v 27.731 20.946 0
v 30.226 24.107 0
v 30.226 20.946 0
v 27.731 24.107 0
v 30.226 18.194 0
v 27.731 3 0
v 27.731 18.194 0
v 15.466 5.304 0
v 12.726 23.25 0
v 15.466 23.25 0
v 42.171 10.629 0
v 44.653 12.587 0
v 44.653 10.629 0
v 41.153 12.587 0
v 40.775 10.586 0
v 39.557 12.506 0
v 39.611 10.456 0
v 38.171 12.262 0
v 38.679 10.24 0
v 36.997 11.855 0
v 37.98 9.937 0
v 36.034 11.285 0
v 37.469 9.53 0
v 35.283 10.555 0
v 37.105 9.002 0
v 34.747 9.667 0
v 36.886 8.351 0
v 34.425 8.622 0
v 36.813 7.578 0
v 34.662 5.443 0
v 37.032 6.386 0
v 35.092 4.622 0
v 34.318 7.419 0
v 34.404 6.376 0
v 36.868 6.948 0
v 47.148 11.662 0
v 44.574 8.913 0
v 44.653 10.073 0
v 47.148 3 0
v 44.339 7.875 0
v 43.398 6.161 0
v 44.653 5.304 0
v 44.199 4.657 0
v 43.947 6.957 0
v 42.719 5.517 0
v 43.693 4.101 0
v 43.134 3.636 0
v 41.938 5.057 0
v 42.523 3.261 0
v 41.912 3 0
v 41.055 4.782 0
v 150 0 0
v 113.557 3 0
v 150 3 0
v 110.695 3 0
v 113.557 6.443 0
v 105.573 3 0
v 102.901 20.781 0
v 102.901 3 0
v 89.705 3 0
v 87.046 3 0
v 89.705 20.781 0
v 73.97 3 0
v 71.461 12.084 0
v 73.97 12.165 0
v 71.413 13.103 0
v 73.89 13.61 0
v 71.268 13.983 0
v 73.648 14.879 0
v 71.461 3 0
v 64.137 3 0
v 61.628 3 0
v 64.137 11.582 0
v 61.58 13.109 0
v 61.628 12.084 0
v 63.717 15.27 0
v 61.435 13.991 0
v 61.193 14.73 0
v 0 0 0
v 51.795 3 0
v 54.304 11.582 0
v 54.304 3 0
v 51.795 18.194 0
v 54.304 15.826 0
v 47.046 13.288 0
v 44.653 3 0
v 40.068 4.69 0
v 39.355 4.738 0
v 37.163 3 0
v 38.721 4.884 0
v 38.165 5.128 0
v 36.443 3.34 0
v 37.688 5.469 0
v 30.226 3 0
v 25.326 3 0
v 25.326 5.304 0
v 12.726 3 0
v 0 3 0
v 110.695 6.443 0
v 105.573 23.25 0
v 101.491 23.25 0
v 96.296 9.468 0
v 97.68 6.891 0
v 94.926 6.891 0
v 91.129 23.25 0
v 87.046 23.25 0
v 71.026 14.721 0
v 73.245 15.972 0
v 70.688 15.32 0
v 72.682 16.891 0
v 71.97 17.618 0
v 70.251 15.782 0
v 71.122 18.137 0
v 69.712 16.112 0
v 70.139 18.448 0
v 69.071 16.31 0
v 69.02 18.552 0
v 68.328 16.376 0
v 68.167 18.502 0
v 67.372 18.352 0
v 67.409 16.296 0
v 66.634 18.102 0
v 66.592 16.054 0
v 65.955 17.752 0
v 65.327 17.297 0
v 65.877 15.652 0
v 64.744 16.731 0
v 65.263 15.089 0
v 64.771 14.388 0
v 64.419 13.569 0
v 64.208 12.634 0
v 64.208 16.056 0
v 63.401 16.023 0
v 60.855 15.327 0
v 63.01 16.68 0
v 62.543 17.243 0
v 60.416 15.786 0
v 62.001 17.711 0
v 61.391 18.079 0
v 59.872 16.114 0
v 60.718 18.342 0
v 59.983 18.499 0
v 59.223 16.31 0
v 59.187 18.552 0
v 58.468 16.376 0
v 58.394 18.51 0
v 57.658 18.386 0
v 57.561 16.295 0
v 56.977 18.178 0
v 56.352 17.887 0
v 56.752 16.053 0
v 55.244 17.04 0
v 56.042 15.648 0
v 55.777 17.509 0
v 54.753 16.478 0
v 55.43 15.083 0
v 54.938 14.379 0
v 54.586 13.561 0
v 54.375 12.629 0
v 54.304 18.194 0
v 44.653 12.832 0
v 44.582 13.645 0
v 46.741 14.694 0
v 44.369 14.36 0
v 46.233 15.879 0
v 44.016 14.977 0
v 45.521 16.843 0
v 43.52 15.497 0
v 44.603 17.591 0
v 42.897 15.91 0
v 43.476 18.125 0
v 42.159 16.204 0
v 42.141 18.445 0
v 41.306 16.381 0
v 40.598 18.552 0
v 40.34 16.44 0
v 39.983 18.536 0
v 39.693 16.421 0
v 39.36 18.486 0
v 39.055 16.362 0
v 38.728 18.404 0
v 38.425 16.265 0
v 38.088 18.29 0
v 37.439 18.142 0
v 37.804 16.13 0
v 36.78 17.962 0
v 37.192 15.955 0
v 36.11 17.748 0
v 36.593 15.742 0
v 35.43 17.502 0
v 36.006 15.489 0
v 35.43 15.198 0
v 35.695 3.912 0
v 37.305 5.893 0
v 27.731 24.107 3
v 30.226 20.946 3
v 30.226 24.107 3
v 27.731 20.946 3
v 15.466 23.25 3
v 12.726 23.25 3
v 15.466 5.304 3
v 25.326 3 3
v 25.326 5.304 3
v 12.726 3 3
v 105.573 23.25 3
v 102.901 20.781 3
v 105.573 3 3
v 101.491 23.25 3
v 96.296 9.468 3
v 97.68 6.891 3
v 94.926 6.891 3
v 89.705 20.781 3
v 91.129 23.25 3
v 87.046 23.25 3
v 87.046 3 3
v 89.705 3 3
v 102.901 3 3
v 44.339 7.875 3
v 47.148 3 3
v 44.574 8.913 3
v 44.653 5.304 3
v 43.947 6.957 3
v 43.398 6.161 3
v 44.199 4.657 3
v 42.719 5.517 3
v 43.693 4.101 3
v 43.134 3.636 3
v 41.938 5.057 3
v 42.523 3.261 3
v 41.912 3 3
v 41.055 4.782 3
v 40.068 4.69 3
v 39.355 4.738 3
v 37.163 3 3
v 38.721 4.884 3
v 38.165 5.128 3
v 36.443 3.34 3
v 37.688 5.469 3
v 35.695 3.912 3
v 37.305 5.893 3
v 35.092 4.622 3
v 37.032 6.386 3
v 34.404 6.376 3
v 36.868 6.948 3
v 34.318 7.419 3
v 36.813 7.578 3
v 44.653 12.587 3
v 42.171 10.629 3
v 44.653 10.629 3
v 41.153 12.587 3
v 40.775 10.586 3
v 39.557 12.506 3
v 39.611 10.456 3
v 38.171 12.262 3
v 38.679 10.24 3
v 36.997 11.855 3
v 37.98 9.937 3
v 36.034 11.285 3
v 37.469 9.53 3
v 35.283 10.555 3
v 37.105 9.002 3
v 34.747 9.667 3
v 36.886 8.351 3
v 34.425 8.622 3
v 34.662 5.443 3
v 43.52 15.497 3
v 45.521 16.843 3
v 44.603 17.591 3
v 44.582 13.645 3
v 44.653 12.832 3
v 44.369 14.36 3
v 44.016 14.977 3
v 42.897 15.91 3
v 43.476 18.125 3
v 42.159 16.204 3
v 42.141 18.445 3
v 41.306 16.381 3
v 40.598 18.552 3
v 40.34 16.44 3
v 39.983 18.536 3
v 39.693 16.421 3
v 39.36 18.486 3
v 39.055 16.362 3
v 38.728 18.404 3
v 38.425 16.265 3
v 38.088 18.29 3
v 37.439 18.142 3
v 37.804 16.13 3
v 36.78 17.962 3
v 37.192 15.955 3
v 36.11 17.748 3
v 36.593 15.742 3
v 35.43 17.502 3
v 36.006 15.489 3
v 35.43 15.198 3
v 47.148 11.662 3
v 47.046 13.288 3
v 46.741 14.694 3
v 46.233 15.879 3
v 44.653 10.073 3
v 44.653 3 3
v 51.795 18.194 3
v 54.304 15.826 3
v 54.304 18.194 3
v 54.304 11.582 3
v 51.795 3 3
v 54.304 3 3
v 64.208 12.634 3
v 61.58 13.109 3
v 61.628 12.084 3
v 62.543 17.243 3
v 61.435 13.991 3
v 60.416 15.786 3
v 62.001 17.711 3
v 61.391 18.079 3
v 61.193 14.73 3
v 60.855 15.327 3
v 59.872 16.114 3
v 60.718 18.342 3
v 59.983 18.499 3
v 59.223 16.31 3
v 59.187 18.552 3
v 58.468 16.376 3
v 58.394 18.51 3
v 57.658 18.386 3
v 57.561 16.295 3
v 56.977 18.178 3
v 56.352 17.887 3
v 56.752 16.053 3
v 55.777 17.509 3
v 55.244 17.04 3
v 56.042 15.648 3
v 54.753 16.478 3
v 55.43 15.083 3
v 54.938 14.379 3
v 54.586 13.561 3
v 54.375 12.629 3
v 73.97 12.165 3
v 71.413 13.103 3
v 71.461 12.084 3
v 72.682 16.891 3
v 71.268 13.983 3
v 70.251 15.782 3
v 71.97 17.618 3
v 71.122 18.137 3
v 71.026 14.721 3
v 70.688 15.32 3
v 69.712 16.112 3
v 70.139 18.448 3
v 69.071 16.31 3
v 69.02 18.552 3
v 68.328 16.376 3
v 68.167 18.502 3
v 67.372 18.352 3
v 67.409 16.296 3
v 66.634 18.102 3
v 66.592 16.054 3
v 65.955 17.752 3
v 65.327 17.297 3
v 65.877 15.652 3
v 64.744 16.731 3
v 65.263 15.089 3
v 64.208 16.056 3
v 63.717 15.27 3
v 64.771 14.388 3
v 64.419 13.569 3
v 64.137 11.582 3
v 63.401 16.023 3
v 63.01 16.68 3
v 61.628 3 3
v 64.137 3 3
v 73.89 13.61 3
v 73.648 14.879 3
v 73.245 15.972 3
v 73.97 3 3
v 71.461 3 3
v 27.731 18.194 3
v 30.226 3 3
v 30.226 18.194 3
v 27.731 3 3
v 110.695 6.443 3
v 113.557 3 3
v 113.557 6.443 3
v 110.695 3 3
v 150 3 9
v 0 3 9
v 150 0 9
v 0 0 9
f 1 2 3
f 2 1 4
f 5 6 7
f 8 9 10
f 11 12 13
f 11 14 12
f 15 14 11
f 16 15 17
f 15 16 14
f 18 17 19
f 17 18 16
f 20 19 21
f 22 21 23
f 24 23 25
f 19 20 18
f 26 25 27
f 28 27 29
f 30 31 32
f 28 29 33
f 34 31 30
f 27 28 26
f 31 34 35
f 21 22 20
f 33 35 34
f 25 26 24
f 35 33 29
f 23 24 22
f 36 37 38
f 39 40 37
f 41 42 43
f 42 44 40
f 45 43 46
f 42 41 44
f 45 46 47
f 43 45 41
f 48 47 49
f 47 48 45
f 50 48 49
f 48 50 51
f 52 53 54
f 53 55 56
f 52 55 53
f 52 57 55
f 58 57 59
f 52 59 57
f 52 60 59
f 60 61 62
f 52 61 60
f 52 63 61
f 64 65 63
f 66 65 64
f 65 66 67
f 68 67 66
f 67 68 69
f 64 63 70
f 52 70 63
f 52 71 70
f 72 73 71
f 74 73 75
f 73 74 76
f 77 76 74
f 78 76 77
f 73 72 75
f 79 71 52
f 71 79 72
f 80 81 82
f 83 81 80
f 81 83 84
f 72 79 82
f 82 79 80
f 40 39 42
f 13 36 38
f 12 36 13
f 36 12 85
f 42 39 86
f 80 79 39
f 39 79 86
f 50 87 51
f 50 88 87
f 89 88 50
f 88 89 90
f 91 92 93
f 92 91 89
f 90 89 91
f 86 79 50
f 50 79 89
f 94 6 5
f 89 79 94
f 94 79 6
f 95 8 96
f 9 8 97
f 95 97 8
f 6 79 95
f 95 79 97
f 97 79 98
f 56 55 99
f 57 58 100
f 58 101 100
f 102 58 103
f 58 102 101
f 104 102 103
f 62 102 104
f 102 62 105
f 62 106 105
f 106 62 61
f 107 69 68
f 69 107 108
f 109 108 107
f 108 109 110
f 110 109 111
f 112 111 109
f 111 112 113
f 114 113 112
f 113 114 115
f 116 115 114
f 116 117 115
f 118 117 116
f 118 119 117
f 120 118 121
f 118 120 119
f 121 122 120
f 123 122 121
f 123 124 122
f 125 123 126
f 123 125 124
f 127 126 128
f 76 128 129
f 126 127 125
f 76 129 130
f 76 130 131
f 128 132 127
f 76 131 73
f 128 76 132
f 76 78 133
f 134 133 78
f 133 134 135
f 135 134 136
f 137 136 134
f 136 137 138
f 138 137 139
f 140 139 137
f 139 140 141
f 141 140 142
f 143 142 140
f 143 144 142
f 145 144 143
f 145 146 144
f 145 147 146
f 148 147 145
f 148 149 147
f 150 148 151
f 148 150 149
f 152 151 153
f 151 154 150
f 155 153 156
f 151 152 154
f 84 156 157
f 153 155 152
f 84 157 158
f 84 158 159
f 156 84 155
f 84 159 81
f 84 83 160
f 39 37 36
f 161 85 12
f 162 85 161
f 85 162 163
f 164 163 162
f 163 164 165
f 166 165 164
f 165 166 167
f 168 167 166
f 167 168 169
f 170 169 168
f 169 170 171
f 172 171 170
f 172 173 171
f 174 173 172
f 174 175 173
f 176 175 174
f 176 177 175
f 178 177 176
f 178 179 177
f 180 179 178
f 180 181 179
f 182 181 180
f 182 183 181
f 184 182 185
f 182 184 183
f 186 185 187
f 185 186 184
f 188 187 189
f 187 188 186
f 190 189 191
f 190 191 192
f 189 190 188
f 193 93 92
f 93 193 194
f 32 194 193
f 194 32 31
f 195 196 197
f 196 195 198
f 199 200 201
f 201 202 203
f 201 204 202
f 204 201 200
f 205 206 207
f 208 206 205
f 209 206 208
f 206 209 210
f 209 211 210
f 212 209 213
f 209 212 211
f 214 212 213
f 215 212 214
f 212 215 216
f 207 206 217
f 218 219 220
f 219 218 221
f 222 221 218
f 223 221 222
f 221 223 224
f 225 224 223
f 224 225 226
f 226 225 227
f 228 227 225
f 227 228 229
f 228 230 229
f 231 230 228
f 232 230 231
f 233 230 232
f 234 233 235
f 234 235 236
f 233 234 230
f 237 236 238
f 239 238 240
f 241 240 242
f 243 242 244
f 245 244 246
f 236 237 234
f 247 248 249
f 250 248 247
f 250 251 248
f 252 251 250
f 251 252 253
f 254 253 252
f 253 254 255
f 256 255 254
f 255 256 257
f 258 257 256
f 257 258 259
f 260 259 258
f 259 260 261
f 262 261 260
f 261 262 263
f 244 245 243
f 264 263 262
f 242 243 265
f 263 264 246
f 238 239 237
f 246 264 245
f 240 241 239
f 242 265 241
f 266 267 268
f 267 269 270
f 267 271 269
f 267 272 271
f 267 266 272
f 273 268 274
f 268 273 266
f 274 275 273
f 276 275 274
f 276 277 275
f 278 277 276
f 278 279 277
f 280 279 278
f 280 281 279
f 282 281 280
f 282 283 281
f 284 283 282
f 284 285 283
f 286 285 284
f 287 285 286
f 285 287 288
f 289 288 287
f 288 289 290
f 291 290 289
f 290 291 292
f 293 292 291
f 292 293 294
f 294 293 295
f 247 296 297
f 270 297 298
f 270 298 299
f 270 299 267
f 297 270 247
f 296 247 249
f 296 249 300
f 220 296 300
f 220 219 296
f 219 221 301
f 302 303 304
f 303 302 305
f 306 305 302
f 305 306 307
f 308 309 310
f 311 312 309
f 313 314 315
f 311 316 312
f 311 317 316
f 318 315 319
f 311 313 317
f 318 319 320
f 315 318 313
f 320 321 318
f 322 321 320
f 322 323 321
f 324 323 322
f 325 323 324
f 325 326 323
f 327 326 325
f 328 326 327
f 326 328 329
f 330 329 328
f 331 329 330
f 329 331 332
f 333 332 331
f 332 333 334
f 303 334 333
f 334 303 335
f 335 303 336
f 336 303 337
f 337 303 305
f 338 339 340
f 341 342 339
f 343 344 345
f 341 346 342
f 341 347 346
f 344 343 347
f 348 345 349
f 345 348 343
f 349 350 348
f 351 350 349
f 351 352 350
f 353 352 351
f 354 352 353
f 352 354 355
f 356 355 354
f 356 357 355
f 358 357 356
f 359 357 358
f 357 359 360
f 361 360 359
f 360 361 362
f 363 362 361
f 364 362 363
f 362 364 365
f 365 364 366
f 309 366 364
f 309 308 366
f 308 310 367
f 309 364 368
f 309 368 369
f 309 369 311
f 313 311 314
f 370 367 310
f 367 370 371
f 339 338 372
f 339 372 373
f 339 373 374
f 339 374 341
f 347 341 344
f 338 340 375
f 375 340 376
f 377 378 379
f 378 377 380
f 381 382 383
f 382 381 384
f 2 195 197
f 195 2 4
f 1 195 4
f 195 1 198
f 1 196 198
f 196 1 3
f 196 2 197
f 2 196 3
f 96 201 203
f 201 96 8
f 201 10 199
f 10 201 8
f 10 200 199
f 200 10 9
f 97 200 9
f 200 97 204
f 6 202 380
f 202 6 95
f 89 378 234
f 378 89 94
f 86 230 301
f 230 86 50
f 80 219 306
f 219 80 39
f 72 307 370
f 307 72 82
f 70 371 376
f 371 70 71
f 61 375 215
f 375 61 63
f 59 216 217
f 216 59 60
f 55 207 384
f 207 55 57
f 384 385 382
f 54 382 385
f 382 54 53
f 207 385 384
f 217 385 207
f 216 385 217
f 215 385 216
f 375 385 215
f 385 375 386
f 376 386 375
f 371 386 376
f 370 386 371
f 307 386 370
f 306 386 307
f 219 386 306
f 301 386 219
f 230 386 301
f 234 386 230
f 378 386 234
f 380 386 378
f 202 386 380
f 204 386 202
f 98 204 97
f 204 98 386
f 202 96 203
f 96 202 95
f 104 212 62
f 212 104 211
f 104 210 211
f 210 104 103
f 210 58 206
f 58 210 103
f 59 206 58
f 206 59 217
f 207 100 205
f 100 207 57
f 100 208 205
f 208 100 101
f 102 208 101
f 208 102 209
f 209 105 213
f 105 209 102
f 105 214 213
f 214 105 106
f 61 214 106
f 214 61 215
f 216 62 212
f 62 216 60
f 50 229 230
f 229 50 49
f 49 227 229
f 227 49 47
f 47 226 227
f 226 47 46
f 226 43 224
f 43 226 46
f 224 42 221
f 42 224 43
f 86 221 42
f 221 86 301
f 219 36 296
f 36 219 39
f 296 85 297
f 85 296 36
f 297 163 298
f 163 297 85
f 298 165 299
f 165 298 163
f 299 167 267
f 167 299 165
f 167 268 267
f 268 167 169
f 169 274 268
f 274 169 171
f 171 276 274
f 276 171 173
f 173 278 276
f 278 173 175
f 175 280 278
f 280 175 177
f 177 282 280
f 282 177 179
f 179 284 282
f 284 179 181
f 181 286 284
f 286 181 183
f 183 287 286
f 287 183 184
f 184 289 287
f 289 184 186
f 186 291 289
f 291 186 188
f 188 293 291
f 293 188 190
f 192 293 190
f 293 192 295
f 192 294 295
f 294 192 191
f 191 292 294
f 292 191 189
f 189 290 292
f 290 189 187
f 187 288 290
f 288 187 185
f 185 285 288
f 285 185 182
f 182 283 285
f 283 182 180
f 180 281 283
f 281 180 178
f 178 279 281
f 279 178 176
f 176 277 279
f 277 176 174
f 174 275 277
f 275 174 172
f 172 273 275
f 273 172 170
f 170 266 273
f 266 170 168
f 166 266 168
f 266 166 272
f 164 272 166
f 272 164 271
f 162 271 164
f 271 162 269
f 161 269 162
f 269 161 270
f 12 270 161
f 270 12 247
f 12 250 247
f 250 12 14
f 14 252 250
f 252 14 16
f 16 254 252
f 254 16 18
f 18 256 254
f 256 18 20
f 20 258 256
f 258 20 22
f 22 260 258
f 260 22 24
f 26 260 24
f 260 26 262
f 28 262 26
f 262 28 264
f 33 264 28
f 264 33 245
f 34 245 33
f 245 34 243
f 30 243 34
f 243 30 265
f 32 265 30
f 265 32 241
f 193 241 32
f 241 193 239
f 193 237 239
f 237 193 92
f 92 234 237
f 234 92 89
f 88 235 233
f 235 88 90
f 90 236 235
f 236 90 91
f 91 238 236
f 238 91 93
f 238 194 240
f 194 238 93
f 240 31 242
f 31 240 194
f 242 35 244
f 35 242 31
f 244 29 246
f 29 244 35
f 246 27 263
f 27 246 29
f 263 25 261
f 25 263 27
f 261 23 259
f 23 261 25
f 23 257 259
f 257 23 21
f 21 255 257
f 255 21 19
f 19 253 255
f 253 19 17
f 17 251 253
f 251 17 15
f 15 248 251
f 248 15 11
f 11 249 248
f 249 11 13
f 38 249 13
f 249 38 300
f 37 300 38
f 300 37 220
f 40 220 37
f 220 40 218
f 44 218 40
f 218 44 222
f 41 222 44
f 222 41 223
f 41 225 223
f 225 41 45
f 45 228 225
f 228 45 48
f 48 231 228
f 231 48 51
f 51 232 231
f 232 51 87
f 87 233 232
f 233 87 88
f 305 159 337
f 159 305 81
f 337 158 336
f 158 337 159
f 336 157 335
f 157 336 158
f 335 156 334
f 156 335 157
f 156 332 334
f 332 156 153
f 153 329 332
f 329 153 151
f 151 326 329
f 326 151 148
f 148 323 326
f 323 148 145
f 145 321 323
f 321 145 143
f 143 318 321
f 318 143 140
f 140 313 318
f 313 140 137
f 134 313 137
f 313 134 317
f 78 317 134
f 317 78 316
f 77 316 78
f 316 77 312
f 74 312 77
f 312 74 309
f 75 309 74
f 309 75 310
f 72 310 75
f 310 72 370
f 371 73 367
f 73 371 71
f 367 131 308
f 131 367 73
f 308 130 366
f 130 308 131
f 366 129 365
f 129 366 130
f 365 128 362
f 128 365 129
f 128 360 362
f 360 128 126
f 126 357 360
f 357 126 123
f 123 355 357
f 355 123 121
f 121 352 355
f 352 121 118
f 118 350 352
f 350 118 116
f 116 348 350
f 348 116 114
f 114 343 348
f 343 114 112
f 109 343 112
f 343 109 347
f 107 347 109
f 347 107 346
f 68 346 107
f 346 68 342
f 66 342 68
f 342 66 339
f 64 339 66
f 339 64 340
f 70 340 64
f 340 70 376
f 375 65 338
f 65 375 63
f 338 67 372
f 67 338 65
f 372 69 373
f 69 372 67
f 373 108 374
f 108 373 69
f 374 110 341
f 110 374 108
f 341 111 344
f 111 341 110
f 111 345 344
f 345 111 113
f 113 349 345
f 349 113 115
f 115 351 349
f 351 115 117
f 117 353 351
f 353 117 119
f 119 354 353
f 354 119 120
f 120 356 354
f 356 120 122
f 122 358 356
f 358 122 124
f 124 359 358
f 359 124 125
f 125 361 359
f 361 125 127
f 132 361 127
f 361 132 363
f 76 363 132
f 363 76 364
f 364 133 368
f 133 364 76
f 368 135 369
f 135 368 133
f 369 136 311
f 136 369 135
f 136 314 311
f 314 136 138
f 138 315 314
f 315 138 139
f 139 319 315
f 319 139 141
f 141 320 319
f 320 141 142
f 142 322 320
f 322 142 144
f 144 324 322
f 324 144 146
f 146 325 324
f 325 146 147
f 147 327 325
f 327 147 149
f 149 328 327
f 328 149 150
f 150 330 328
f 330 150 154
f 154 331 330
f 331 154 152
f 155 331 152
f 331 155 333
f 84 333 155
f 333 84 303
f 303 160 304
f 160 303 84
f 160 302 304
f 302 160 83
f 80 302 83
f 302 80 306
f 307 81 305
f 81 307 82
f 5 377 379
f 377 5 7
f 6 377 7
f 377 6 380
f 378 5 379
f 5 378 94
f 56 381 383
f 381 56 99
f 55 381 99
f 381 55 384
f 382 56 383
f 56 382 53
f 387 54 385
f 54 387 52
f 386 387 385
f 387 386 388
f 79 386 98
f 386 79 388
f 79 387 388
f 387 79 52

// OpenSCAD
// Cascadia Code Semibold
translate([10, 3, 0])
linear_extrude(height=3)
    text("Liam M.", 20, "Microsoft Sans Serif");

cube([150, 3, 9]);
